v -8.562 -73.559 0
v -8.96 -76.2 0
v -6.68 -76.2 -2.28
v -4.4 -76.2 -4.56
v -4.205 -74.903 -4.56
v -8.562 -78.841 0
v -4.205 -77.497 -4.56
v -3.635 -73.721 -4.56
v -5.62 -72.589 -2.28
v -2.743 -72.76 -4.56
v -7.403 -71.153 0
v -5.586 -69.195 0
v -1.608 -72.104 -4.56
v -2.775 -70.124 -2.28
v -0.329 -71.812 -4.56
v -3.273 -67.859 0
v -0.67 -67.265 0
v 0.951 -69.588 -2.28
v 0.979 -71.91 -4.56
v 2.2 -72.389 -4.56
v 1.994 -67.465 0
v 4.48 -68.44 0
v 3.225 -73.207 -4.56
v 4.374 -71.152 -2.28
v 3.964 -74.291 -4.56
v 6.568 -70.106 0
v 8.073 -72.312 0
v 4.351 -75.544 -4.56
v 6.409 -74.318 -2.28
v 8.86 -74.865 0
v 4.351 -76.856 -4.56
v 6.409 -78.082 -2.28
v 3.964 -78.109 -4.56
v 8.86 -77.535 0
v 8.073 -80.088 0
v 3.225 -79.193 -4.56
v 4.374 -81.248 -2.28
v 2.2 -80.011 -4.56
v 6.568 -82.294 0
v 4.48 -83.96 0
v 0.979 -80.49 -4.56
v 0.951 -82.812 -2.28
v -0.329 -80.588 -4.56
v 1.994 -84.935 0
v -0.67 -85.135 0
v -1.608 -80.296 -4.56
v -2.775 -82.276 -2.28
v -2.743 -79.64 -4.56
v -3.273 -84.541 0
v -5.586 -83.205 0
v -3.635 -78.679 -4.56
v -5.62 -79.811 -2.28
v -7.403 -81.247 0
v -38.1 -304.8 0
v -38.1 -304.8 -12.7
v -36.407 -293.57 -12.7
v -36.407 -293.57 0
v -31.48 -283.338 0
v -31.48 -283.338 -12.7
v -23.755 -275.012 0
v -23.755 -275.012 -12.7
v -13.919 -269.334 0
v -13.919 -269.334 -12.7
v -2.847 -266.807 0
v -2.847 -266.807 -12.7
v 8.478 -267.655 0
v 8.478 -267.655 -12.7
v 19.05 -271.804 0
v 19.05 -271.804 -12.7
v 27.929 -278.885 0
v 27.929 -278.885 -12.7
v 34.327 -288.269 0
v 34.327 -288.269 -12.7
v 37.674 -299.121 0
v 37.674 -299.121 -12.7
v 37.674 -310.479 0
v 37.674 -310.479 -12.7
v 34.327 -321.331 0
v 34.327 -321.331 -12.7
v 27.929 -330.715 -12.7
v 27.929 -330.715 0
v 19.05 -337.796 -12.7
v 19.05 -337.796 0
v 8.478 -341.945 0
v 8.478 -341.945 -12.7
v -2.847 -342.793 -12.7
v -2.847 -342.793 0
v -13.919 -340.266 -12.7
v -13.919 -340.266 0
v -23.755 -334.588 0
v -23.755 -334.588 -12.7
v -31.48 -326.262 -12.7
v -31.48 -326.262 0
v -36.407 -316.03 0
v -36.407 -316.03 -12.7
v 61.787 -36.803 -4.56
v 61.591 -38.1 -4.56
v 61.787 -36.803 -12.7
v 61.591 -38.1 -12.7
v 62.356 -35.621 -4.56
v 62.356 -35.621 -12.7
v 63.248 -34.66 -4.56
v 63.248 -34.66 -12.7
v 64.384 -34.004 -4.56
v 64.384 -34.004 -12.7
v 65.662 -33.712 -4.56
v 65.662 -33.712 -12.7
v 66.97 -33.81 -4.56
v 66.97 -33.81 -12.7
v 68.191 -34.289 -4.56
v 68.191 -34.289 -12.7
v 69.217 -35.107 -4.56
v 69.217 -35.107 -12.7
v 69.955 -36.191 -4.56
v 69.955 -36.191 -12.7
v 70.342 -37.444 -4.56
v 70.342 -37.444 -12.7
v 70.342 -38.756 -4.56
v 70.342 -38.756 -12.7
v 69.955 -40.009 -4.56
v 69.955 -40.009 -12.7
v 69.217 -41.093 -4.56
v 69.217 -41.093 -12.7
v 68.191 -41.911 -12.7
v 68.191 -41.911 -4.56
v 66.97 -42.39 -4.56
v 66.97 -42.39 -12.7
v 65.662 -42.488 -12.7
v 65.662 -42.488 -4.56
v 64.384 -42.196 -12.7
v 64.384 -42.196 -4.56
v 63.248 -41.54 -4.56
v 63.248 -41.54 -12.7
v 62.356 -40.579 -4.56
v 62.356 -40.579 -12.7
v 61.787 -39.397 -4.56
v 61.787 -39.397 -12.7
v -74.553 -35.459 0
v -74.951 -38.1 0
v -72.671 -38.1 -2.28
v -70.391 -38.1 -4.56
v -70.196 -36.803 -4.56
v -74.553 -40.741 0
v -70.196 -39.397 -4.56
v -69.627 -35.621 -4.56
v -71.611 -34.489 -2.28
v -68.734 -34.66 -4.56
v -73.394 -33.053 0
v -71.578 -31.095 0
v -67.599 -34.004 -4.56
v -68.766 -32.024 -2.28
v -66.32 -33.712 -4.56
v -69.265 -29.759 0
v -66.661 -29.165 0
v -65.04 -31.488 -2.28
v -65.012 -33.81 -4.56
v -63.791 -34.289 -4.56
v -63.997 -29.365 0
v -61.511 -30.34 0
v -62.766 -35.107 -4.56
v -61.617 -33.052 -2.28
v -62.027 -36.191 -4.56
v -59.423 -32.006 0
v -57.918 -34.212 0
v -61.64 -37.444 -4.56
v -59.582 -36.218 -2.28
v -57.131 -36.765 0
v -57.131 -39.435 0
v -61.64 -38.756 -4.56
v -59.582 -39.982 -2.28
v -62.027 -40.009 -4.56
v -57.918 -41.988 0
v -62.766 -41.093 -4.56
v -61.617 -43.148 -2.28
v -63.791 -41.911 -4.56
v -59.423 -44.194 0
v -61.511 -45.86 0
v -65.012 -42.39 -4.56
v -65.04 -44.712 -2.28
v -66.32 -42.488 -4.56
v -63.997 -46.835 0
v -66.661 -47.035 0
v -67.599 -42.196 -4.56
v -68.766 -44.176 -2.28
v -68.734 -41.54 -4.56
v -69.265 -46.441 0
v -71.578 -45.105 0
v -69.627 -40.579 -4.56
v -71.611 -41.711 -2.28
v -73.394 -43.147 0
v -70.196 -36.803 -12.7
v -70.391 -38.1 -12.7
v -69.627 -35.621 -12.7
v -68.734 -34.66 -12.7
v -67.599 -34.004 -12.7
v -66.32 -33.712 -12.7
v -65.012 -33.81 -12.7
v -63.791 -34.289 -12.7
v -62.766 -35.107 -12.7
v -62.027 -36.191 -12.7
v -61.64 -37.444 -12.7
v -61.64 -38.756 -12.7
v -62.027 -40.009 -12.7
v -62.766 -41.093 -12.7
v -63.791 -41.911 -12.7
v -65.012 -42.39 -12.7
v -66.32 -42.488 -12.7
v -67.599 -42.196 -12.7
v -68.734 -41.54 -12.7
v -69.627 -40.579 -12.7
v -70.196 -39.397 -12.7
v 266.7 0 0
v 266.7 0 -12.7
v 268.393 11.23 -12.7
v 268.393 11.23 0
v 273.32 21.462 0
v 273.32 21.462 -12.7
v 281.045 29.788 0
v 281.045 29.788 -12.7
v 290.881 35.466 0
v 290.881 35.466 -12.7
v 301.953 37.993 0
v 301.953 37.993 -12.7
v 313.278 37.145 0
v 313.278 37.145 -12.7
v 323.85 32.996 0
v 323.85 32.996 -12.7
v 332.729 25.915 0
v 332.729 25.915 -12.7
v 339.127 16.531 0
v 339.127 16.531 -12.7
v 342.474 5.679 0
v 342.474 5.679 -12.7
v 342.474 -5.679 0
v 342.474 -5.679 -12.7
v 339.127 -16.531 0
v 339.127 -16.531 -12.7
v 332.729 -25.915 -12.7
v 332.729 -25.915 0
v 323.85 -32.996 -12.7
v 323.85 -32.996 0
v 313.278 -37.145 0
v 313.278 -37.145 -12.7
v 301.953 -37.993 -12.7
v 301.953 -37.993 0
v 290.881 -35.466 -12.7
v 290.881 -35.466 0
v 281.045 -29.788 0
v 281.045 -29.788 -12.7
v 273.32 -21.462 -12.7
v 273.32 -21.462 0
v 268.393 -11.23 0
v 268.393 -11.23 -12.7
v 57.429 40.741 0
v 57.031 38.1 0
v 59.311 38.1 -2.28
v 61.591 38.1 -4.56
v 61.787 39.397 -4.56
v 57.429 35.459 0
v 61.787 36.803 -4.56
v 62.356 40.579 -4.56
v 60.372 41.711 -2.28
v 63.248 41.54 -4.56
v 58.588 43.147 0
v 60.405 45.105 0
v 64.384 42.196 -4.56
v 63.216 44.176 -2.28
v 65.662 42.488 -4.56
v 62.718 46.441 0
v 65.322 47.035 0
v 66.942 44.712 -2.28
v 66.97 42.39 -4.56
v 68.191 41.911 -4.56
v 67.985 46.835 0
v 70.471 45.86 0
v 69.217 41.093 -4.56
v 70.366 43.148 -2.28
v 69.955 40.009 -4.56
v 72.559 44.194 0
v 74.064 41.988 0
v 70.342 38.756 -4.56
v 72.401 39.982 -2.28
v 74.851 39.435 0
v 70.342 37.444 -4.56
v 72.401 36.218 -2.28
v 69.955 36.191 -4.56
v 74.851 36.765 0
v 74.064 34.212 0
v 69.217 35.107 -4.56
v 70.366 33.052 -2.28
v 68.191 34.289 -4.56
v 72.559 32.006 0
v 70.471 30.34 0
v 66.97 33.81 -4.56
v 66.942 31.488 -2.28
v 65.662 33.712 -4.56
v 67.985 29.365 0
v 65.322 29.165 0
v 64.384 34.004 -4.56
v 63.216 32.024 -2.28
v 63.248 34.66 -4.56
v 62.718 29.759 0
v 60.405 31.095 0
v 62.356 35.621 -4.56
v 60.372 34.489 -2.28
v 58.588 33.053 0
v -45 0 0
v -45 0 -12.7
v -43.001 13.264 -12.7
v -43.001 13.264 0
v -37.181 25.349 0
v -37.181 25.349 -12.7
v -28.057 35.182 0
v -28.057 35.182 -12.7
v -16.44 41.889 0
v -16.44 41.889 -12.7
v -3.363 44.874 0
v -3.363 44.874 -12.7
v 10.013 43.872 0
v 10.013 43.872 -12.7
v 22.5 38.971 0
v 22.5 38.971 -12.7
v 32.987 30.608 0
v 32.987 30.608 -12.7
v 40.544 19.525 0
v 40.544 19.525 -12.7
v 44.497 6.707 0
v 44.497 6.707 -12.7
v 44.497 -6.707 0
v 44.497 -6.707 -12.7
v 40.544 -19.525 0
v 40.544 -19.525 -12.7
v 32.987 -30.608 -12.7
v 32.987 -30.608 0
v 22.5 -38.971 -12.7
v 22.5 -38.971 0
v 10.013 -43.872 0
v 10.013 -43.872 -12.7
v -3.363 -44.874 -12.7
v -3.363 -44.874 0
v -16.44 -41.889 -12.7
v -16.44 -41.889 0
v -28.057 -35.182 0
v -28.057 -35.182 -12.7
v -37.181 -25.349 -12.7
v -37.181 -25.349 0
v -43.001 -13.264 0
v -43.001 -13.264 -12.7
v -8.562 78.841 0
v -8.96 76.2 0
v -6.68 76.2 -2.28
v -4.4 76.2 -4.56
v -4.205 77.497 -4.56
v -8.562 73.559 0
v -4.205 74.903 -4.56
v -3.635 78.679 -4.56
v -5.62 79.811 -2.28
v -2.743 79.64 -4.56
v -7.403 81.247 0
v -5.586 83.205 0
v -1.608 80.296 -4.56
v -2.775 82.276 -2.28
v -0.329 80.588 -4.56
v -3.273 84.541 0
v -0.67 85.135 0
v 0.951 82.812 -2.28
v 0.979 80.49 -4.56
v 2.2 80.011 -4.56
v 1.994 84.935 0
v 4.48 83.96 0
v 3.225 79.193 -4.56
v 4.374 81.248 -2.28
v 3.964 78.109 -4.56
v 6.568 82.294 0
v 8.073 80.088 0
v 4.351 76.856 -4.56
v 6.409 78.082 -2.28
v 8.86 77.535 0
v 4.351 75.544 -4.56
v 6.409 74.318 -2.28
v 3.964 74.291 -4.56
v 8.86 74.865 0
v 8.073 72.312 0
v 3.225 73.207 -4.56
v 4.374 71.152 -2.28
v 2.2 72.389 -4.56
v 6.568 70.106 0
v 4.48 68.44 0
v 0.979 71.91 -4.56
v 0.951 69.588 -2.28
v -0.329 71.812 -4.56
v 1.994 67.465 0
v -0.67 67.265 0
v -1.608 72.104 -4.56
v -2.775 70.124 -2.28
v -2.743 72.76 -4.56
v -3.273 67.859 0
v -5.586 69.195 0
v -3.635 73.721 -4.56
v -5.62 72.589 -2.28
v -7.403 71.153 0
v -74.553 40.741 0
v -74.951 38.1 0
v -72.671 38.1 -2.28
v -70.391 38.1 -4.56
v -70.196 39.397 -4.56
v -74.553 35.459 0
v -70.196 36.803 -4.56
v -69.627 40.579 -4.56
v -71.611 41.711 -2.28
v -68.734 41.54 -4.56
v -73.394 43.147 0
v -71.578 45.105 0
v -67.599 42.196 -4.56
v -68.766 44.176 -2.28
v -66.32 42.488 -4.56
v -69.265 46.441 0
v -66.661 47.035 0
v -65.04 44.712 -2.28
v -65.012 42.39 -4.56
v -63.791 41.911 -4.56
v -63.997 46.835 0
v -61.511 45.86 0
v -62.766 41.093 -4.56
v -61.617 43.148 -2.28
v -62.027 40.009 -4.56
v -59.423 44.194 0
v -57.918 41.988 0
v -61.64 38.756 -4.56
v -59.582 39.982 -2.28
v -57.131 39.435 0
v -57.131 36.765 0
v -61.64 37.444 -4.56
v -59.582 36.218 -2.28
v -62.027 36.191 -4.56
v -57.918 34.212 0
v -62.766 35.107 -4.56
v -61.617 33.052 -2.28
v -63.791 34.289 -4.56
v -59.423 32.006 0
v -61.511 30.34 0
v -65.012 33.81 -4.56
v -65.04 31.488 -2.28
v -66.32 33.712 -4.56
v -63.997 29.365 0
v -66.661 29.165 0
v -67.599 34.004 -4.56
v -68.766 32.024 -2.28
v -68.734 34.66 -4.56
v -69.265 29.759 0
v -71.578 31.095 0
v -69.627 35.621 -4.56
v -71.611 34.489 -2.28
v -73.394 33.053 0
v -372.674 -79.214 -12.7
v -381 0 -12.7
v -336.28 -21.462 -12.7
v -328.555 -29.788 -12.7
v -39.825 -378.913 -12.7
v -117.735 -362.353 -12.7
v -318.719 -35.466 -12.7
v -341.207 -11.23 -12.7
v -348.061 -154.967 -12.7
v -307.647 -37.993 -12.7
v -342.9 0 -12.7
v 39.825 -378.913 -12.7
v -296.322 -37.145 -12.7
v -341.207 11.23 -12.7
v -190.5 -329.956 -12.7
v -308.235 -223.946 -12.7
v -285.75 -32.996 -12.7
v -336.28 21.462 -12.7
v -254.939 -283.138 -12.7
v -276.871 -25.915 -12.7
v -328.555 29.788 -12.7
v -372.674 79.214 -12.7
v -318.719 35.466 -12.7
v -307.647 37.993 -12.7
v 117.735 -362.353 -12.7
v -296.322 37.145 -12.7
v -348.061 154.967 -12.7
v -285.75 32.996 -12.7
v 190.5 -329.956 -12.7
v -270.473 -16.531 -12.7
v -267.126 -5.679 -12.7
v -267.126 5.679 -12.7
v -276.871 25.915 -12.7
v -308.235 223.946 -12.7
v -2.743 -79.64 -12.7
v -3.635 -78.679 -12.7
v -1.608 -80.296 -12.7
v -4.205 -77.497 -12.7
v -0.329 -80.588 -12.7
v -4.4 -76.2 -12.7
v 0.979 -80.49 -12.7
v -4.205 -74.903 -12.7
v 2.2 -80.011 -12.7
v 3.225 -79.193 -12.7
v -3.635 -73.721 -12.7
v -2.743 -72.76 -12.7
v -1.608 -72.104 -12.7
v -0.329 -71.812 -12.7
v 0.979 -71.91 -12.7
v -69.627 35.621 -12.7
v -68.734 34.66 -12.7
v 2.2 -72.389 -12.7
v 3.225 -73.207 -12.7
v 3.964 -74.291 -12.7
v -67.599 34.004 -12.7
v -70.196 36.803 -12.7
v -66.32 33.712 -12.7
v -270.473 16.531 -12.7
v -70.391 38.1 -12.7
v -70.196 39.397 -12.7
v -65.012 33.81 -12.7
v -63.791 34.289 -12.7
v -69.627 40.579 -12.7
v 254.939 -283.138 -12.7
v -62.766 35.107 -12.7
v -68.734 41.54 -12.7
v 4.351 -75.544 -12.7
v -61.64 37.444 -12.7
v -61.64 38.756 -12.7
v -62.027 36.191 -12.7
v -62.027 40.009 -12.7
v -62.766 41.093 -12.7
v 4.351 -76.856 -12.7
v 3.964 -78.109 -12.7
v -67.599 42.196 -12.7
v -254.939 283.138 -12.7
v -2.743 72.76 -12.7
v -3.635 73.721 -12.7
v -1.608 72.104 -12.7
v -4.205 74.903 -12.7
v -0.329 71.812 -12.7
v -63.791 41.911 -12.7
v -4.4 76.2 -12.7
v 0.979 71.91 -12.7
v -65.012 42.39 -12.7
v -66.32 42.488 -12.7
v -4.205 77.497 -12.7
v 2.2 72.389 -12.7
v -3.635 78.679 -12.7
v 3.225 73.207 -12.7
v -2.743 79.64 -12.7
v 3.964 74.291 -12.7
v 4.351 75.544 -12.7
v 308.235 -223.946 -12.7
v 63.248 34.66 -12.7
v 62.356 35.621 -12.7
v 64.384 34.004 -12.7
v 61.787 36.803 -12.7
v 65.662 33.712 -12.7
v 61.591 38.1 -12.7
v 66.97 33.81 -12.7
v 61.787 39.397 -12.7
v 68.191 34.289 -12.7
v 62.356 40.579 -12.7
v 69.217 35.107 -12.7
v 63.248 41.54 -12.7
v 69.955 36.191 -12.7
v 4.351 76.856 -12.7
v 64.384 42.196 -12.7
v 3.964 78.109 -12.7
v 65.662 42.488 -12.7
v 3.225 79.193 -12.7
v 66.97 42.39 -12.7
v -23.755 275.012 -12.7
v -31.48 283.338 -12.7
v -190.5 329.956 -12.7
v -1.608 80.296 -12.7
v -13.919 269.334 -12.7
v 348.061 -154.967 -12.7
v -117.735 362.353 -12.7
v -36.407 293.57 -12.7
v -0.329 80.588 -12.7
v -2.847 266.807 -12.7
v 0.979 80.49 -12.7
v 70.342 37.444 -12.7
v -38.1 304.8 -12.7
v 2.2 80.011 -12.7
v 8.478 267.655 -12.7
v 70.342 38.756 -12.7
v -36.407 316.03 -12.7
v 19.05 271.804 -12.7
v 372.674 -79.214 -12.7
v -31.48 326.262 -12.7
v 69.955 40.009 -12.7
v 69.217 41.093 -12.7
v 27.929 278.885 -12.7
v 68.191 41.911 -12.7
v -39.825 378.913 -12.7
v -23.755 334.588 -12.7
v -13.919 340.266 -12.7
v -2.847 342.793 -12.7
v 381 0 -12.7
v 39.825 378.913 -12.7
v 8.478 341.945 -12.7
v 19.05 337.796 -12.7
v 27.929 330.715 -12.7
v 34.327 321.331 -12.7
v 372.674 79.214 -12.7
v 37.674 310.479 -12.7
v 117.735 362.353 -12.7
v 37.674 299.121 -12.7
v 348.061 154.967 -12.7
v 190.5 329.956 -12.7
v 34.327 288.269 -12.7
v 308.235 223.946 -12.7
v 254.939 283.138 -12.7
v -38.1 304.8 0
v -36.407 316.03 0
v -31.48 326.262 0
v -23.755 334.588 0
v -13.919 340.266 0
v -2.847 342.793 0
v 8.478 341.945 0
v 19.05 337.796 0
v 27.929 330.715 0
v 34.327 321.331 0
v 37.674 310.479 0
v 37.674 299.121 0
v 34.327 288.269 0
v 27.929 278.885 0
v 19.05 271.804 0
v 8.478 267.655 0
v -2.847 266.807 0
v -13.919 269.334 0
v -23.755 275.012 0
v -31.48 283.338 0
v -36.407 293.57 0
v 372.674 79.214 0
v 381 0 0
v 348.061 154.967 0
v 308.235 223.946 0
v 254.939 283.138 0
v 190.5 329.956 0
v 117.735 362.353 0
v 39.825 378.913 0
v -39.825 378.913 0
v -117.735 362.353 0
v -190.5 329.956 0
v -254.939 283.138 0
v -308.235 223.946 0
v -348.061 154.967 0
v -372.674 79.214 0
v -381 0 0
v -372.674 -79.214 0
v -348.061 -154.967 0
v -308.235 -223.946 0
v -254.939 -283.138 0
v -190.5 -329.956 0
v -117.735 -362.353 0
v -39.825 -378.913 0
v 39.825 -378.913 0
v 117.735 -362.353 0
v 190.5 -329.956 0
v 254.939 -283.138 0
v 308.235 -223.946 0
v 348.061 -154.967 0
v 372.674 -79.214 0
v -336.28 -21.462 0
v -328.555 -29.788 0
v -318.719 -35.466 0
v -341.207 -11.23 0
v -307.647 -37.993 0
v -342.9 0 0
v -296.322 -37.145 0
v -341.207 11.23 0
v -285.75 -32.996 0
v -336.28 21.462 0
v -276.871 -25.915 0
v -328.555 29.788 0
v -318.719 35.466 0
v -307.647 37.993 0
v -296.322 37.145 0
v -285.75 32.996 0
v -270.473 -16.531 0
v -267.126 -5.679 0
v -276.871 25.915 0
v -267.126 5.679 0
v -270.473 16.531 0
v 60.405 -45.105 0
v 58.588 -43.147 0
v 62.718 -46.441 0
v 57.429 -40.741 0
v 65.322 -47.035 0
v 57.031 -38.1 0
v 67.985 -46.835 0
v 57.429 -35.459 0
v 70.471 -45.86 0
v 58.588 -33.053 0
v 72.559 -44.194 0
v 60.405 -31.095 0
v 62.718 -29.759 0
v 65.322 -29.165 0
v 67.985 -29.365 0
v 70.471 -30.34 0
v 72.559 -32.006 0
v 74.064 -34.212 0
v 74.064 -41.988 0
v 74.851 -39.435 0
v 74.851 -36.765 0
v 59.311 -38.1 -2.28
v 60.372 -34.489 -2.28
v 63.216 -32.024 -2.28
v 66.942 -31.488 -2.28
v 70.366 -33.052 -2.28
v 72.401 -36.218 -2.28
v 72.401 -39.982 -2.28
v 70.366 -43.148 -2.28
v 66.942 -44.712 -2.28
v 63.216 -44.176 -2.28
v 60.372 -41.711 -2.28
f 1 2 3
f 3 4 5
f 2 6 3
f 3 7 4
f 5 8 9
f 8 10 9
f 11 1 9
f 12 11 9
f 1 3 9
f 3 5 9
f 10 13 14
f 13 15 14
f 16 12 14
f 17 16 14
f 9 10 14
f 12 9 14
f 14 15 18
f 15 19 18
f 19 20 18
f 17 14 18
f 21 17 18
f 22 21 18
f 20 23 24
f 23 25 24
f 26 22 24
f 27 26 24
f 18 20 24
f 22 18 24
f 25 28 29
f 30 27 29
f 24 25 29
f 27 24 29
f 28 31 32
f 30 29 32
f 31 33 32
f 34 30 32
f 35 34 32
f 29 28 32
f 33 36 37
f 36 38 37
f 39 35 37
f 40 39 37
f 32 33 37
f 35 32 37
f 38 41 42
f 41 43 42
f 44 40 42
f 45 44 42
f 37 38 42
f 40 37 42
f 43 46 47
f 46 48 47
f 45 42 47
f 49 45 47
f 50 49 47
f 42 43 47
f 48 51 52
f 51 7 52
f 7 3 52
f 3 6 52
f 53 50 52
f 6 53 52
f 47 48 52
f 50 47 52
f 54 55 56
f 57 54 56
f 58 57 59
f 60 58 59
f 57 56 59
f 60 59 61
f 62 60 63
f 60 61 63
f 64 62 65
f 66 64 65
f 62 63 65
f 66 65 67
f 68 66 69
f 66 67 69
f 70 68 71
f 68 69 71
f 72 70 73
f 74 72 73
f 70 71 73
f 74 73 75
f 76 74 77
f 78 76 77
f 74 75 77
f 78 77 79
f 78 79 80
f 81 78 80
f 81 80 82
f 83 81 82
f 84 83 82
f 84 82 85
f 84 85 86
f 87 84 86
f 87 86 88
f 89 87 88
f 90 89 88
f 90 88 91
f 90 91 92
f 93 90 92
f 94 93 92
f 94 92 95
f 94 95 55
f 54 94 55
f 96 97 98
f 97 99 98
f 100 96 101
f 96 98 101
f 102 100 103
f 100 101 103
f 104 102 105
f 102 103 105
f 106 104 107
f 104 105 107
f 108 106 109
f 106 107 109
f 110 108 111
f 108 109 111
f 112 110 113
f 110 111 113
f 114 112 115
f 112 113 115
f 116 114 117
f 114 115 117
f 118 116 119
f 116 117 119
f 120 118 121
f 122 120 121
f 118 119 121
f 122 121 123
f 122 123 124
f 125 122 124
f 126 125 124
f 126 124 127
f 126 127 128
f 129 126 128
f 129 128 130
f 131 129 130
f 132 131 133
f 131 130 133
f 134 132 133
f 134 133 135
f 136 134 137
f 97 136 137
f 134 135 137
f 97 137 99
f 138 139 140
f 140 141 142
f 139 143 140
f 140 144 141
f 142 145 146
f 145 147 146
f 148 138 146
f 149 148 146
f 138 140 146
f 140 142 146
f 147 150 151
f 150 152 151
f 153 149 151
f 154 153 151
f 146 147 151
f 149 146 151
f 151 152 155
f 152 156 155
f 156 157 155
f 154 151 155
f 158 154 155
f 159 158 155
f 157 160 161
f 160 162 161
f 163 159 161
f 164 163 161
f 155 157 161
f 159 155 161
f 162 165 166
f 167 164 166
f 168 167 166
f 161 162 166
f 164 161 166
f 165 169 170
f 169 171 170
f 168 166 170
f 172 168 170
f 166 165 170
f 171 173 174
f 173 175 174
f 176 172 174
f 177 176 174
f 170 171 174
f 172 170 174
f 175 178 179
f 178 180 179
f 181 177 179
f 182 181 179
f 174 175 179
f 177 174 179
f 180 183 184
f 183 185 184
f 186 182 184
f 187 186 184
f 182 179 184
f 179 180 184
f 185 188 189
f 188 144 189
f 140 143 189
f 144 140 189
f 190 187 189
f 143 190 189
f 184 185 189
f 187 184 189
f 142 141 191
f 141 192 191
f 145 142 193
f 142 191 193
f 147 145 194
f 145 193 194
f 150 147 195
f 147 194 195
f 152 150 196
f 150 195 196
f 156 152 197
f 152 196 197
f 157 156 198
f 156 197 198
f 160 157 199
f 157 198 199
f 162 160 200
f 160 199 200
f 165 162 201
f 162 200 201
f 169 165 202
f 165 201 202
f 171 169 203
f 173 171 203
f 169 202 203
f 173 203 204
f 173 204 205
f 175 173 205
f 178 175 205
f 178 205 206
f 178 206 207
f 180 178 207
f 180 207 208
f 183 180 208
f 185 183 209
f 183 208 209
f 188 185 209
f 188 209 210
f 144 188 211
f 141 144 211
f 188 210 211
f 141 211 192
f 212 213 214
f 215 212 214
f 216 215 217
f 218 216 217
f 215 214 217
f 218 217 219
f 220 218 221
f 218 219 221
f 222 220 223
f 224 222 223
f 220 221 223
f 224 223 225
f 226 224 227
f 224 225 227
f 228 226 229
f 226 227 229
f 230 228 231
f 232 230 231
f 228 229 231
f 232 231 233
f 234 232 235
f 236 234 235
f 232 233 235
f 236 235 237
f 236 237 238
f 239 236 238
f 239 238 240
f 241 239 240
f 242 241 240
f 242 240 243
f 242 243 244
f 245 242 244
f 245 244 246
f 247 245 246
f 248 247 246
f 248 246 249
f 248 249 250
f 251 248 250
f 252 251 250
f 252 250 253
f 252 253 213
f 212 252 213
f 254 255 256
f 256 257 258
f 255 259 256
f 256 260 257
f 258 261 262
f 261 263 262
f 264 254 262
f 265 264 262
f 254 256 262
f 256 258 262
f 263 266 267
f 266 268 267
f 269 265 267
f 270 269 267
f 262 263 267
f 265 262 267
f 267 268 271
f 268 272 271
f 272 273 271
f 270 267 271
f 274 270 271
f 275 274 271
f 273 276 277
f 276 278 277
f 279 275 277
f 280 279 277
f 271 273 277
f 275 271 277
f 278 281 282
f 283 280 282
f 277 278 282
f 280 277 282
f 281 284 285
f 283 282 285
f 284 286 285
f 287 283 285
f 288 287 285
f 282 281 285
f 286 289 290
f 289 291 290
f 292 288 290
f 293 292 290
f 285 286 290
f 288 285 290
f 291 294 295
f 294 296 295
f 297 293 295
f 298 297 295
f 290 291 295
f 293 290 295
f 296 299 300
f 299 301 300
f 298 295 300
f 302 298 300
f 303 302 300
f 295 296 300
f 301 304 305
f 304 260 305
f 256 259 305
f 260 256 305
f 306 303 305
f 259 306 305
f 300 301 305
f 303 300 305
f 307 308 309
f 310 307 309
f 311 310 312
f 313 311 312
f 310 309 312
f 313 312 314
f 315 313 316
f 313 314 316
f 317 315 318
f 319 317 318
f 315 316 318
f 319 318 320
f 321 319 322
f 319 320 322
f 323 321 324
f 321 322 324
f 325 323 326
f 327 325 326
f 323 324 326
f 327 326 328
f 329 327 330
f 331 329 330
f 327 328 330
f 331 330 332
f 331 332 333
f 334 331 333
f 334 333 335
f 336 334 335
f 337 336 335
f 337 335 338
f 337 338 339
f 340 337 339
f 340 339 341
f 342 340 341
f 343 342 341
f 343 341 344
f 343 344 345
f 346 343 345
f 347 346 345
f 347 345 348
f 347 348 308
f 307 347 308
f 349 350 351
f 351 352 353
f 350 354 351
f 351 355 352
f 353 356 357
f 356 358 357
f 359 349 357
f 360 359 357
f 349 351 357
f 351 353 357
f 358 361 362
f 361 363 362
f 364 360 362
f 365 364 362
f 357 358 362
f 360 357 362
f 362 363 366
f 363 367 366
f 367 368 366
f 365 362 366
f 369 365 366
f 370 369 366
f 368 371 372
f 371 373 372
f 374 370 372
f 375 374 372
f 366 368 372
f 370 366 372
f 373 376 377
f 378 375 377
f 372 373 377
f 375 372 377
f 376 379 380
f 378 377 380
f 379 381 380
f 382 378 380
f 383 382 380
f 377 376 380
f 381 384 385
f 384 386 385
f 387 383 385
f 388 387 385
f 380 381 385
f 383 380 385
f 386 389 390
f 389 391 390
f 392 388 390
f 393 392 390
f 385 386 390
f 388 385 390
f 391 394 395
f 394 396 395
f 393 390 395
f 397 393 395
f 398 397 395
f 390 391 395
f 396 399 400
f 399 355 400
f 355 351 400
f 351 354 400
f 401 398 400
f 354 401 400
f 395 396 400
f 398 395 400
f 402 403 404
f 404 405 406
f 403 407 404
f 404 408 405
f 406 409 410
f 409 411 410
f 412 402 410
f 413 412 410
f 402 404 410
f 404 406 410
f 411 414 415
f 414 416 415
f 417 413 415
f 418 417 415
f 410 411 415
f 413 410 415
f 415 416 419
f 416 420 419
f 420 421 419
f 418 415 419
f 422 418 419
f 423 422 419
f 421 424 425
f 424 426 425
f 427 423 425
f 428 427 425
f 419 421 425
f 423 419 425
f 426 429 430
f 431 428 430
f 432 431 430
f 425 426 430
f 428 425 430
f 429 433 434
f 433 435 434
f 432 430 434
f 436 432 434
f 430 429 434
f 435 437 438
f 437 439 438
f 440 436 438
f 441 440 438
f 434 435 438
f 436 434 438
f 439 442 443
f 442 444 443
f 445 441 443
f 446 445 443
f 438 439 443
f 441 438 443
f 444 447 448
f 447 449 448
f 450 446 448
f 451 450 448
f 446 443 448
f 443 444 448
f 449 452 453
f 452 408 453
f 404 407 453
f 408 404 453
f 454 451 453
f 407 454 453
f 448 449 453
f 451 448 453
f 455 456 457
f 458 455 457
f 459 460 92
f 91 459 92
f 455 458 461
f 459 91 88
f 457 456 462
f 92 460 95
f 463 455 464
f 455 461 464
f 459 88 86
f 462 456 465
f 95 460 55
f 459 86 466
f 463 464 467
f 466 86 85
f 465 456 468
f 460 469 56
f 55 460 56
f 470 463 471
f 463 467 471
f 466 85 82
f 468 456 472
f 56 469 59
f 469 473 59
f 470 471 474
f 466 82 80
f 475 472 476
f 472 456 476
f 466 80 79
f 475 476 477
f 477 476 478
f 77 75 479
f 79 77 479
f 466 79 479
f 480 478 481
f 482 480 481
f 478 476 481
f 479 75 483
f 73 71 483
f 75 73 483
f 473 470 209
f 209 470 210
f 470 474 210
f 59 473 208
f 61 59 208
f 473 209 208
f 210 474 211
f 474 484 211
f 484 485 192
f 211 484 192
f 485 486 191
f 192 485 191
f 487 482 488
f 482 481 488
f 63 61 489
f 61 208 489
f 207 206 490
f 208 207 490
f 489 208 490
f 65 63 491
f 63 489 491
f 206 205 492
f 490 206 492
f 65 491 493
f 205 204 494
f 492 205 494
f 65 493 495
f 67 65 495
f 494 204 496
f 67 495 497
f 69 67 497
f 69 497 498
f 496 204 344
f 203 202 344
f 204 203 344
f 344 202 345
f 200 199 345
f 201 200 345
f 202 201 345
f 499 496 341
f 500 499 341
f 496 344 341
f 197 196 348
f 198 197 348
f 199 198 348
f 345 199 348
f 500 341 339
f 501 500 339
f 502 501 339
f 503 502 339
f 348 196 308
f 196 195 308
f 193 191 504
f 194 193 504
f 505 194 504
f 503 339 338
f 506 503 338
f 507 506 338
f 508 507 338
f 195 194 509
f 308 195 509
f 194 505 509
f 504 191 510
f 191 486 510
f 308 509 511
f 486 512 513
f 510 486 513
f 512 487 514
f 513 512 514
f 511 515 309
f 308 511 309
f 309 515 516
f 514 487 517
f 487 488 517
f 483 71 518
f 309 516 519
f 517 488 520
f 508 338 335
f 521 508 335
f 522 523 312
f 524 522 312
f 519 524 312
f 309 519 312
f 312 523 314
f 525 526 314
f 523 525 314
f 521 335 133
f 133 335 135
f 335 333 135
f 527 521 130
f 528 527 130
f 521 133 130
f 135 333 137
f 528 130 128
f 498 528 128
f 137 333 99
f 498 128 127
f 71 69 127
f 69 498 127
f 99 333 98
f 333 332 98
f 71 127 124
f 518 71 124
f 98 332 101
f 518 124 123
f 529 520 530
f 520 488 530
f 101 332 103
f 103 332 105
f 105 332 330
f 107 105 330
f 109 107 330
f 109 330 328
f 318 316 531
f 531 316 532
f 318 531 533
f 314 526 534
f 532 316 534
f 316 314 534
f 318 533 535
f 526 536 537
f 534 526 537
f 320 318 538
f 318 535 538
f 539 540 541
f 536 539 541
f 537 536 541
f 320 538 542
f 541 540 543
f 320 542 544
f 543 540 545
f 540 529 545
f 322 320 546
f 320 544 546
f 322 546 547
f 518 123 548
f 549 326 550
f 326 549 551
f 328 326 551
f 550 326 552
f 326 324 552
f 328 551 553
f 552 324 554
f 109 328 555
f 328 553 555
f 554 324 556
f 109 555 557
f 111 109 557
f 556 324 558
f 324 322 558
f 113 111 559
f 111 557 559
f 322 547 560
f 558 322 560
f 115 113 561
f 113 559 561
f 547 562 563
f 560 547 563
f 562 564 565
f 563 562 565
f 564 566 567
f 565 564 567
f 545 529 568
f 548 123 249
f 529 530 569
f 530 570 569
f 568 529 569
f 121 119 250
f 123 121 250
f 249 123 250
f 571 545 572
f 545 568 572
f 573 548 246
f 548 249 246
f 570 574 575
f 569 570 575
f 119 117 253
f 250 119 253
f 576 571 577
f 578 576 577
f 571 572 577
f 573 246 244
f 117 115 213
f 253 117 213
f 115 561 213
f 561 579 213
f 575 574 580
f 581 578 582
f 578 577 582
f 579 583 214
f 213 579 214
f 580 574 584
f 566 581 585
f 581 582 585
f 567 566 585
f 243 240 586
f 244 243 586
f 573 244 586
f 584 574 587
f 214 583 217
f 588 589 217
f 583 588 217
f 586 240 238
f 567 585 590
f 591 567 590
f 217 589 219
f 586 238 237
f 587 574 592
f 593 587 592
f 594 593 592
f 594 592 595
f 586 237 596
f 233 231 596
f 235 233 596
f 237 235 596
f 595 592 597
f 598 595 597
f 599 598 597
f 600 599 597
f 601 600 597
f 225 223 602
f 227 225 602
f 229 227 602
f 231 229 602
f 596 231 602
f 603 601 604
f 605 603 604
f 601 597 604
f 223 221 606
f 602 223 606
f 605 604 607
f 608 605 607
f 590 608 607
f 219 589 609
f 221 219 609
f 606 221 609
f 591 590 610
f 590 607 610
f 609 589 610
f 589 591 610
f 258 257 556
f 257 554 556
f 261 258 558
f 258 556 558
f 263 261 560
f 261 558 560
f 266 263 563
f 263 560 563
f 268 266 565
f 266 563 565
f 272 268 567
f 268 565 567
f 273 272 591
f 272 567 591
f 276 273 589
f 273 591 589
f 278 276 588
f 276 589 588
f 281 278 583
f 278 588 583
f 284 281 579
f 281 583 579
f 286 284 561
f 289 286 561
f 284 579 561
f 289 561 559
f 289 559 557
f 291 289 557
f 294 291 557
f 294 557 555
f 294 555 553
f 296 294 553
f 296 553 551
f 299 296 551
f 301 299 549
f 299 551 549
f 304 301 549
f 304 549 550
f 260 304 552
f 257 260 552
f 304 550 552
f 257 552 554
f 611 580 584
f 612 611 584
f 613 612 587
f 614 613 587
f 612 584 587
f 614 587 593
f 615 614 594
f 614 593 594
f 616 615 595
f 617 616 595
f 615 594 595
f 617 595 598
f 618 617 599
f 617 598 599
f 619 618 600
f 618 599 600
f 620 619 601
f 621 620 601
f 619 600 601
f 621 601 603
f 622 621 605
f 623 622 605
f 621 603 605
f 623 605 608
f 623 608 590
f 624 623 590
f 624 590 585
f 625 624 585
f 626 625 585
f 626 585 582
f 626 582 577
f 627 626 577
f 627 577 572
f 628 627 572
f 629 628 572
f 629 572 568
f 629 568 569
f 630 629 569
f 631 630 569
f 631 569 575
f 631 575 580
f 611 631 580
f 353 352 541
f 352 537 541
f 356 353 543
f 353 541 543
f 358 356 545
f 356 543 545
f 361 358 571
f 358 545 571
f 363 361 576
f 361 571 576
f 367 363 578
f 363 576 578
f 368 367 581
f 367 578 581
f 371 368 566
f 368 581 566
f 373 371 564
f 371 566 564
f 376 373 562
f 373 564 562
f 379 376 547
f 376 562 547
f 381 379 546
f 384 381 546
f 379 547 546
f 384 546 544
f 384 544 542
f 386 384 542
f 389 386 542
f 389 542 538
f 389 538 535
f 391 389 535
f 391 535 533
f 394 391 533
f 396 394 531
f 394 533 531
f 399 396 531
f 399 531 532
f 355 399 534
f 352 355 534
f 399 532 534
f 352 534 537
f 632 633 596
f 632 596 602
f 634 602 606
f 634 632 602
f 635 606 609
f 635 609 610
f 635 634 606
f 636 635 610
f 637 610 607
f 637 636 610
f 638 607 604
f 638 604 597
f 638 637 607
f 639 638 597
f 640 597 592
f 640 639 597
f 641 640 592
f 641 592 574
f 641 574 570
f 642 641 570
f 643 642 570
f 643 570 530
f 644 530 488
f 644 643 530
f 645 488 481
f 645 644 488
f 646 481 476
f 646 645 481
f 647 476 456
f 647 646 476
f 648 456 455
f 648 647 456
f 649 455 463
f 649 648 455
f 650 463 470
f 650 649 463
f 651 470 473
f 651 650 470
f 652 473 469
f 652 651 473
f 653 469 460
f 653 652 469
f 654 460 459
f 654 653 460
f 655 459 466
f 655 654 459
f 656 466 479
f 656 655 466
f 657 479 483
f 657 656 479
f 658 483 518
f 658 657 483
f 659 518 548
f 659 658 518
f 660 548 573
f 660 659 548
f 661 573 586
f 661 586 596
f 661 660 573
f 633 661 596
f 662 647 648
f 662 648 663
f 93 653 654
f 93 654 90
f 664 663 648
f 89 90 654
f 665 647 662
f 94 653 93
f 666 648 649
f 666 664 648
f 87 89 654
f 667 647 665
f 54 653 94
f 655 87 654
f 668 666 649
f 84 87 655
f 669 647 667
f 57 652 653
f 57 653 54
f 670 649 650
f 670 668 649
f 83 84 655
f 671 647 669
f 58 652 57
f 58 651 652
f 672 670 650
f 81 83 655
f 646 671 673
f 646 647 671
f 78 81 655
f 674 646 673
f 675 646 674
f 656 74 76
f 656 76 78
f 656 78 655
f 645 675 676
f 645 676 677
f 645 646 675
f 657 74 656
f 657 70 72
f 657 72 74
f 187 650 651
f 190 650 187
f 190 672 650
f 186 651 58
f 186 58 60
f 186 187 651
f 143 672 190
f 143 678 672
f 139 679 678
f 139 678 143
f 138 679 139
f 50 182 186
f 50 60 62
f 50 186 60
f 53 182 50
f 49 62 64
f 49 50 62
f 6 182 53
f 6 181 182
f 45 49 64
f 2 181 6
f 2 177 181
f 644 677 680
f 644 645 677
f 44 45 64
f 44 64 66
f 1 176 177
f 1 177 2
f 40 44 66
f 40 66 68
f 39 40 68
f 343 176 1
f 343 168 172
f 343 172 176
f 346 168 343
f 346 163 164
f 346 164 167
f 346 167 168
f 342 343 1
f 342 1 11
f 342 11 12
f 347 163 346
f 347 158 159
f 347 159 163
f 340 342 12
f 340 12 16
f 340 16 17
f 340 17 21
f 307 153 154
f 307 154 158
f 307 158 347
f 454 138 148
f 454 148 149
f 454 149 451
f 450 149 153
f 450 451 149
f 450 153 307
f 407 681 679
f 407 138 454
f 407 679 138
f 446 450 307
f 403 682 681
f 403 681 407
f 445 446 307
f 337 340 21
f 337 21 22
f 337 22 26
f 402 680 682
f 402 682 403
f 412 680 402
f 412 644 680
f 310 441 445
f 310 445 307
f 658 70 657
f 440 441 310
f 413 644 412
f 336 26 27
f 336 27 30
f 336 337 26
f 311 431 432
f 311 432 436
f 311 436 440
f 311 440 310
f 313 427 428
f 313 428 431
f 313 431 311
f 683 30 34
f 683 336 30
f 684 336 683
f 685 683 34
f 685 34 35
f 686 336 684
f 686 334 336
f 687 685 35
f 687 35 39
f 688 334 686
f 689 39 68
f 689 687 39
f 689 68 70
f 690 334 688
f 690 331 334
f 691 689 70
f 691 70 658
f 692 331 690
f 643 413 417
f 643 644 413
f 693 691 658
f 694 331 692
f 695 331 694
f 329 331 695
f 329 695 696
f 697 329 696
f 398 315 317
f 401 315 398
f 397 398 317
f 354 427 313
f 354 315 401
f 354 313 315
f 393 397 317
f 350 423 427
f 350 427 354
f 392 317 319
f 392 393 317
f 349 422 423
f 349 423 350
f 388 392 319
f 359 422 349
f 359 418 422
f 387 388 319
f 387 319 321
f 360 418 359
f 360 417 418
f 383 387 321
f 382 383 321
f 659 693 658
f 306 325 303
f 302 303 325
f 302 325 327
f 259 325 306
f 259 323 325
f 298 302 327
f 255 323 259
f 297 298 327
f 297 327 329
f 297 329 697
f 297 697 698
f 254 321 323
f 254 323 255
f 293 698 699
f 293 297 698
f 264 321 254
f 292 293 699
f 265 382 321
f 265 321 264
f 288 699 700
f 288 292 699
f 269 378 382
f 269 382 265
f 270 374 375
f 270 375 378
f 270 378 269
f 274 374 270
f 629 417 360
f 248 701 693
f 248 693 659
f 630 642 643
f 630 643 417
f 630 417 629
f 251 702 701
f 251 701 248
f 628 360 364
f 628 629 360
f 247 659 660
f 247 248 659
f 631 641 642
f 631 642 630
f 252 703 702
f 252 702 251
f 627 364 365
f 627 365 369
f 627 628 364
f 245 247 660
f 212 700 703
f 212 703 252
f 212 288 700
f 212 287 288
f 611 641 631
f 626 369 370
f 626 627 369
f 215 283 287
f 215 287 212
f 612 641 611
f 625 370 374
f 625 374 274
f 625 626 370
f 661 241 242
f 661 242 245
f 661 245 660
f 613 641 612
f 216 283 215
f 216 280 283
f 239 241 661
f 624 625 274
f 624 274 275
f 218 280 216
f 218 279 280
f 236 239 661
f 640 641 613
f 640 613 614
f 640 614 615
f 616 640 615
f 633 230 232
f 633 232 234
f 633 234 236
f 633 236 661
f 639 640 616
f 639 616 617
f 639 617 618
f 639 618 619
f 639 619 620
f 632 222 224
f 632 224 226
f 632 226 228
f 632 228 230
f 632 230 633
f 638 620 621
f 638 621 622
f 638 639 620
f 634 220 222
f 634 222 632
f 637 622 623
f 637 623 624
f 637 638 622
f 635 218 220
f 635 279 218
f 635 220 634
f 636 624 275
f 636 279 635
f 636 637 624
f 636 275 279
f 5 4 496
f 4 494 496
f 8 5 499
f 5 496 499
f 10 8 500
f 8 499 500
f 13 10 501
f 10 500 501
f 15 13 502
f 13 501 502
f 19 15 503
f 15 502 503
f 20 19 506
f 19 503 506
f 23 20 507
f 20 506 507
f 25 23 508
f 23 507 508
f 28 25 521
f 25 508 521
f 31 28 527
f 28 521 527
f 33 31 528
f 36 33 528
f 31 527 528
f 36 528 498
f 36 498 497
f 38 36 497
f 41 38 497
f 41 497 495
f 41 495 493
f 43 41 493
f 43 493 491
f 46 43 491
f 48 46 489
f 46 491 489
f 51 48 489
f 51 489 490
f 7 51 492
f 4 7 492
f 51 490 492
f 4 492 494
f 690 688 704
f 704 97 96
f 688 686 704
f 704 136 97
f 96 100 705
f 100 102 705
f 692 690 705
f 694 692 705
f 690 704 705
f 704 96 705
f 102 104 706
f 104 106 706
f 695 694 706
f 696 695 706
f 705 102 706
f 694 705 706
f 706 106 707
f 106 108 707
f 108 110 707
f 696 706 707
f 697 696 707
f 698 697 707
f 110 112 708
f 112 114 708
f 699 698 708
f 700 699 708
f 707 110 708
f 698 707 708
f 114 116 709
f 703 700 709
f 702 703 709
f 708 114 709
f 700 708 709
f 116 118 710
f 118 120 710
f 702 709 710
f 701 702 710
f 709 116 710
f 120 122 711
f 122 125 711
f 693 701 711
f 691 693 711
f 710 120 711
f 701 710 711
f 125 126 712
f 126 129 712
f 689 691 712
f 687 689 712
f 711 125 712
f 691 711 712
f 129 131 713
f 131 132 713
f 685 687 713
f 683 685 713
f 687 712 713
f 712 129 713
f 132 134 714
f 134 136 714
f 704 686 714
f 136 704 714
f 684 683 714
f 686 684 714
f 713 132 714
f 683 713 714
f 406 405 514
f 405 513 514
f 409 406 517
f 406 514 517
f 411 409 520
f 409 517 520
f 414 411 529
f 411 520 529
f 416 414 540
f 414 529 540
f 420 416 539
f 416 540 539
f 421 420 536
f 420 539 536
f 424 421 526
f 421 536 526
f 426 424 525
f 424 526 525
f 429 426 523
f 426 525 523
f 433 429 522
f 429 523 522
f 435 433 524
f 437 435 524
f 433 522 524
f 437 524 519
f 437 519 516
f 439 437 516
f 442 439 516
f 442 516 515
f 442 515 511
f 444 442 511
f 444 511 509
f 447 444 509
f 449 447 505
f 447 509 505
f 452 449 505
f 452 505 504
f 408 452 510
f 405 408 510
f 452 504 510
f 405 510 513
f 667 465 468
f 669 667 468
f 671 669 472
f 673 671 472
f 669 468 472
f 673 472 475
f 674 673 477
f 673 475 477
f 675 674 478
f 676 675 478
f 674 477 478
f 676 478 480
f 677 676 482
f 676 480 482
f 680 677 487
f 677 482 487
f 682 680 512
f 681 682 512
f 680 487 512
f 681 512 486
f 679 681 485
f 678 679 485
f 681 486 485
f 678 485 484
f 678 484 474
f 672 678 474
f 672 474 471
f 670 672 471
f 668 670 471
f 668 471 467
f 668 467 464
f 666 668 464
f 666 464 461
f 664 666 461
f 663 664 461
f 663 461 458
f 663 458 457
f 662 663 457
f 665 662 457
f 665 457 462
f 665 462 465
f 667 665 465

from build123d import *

# Parameters (mm, degrees)
F0_R           = 381
F1_DEPTH       = 12.7
F3_D           = 90
F5_D           = 8.8
F5_CSINK_D     = 17.92
F5_CSINK_ANGLE = 90
F7_D           = 76.2


with BuildPart() as f1:
    # F0 (on Top) → F1 (new body)
    with BuildSketch(Plane.XY):
        Circle(F0_R)
    extrude(amount=-F1_DEPTH)

    # F3 (through all)
    with Locations(Plane.XY):
        with Locations((0, 0)):
            Hole(F3_D / 2)

    # F5 (through all)
    with Locations(Plane.XY):
        with Locations((0, 76.2), (65.9911357684, 38.1), (65.9911357684, -38.1), (0, -76.2), (-65.9911357684, -38.1), (-65.9911357684, 38.1)):
            CounterSinkHole(F5_D / 2, F5_CSINK_D / 2, counter_sink_angle=F5_CSINK_ANGLE)

    # F7 (through all)
    with Locations(Plane.XY):
        with Locations((0, 304.8), (304.8, 0), (0, -304.8), (-304.8, 0)):
            Hole(F7_D / 2)


solid = f1.part
